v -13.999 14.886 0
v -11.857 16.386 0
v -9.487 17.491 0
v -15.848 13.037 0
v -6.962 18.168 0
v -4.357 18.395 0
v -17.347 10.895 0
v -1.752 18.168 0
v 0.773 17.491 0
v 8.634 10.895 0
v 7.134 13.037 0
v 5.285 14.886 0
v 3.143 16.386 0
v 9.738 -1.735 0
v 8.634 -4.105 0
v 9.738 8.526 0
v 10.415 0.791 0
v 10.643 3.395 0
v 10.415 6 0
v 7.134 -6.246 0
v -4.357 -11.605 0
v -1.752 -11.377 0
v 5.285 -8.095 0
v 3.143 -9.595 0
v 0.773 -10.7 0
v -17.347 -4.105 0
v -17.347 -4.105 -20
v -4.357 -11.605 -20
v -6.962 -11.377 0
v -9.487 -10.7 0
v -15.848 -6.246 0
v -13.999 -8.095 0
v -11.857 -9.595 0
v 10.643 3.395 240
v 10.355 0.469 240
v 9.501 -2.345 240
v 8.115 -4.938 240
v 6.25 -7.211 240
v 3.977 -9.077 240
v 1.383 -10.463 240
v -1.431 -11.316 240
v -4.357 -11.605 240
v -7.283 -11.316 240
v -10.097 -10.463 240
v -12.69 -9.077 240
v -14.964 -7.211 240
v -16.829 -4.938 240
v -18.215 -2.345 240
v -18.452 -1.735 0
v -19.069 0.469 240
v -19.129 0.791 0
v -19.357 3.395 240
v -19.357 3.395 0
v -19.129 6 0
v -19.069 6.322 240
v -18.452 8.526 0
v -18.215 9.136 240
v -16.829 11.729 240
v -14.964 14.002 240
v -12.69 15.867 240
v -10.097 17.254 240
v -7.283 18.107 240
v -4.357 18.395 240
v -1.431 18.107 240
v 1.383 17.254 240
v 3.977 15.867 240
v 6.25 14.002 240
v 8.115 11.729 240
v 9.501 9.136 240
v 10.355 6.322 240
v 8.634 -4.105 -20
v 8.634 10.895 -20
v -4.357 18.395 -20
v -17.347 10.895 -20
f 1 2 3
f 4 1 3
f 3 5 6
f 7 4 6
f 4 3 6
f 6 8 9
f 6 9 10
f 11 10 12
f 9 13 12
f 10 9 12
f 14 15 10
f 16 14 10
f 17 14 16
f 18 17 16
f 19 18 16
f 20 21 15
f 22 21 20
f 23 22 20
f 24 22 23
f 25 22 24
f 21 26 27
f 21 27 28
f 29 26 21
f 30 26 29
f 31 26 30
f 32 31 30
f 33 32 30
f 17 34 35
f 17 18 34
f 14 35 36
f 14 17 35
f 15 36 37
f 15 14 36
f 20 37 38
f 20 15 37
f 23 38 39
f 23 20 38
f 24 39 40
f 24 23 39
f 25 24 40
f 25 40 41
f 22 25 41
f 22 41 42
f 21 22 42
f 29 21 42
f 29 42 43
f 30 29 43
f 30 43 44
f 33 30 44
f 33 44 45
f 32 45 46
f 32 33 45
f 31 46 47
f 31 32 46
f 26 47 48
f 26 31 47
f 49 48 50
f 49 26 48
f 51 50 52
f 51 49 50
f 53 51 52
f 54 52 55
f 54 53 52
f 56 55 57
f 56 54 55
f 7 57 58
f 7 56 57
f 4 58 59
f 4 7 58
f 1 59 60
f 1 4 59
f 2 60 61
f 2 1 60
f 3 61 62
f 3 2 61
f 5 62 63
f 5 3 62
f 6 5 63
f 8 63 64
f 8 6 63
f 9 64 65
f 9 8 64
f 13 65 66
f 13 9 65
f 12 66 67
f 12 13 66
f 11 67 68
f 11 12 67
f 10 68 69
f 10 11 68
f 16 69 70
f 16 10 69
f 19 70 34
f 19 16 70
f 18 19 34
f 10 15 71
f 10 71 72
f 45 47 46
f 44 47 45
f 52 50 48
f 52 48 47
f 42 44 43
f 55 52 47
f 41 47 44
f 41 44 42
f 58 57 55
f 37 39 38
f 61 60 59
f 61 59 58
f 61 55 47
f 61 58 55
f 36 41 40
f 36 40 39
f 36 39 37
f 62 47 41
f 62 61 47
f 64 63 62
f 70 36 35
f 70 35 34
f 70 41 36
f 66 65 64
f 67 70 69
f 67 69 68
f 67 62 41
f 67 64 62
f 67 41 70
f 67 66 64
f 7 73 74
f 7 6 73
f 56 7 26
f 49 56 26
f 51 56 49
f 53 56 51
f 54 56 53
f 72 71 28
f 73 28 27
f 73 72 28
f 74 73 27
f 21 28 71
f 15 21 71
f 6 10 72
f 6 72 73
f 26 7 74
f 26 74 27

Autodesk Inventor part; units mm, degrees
ref_plane "YZ Plane" through (0, 0, 0) normal (1, 0, 0) x (0, 1, 0)
ref_plane "XZ Plane" through (0, 0, 0) normal (0, 1, 0) x (-1, 0, 0)
ref_plane "XY Plane" through (0, 0, 0) normal (0, 0, 1) x (1, 0, 0)
sketch "Szkic1" plane through (0, 0, 0) normal (0, 0, 1) x (1, 0, 0)
  circle A0 centre (-4.3569, 3.3954) radius 15
  point P0 (0, 0)
  dimension "d0" = 30
extrude "Wyciągnięcie proste1" add sketch "Szkic1" along normal blind 240
thread "Gwint1" size "TR30x3" class "7e" standard "ISO Metric Trapezoidal Threads" length 230 offset 130
thread "Gwint2" size "TR30x3" class "7e" standard "ISO Metric Trapezoidal Threads" length 110 offset 10
sketch "Szkic2" plane through (-4.3569, 3.3954, 0) normal (0, 0, -1) x (-1, 0, 0)
  circle A0 centre (0, 0) radius 15 projected
  line L0 (0, 15) -> (12.9904, 7.5)
  line L1 (12.9904, 7.5) -> (12.9904, -7.5)
  line L2 (12.9904, -7.5) -> (0, -15)
  line L3 (0, -15) -> (-12.9904, -7.5)
  line L4 (-12.9904, -7.5) -> (-12.9904, 7.5)
  line L5 (-12.9904, 7.5) -> (0, 15)
  point P0 (-4.3569, -3.3954)
  dimension "d9" = 360
extrude "Wyciągnięcie proste2" add sketch "Szkic2" along normal blind 20 contours L1 L2 L3 L4 L5 L0
properties part number "śruba"
